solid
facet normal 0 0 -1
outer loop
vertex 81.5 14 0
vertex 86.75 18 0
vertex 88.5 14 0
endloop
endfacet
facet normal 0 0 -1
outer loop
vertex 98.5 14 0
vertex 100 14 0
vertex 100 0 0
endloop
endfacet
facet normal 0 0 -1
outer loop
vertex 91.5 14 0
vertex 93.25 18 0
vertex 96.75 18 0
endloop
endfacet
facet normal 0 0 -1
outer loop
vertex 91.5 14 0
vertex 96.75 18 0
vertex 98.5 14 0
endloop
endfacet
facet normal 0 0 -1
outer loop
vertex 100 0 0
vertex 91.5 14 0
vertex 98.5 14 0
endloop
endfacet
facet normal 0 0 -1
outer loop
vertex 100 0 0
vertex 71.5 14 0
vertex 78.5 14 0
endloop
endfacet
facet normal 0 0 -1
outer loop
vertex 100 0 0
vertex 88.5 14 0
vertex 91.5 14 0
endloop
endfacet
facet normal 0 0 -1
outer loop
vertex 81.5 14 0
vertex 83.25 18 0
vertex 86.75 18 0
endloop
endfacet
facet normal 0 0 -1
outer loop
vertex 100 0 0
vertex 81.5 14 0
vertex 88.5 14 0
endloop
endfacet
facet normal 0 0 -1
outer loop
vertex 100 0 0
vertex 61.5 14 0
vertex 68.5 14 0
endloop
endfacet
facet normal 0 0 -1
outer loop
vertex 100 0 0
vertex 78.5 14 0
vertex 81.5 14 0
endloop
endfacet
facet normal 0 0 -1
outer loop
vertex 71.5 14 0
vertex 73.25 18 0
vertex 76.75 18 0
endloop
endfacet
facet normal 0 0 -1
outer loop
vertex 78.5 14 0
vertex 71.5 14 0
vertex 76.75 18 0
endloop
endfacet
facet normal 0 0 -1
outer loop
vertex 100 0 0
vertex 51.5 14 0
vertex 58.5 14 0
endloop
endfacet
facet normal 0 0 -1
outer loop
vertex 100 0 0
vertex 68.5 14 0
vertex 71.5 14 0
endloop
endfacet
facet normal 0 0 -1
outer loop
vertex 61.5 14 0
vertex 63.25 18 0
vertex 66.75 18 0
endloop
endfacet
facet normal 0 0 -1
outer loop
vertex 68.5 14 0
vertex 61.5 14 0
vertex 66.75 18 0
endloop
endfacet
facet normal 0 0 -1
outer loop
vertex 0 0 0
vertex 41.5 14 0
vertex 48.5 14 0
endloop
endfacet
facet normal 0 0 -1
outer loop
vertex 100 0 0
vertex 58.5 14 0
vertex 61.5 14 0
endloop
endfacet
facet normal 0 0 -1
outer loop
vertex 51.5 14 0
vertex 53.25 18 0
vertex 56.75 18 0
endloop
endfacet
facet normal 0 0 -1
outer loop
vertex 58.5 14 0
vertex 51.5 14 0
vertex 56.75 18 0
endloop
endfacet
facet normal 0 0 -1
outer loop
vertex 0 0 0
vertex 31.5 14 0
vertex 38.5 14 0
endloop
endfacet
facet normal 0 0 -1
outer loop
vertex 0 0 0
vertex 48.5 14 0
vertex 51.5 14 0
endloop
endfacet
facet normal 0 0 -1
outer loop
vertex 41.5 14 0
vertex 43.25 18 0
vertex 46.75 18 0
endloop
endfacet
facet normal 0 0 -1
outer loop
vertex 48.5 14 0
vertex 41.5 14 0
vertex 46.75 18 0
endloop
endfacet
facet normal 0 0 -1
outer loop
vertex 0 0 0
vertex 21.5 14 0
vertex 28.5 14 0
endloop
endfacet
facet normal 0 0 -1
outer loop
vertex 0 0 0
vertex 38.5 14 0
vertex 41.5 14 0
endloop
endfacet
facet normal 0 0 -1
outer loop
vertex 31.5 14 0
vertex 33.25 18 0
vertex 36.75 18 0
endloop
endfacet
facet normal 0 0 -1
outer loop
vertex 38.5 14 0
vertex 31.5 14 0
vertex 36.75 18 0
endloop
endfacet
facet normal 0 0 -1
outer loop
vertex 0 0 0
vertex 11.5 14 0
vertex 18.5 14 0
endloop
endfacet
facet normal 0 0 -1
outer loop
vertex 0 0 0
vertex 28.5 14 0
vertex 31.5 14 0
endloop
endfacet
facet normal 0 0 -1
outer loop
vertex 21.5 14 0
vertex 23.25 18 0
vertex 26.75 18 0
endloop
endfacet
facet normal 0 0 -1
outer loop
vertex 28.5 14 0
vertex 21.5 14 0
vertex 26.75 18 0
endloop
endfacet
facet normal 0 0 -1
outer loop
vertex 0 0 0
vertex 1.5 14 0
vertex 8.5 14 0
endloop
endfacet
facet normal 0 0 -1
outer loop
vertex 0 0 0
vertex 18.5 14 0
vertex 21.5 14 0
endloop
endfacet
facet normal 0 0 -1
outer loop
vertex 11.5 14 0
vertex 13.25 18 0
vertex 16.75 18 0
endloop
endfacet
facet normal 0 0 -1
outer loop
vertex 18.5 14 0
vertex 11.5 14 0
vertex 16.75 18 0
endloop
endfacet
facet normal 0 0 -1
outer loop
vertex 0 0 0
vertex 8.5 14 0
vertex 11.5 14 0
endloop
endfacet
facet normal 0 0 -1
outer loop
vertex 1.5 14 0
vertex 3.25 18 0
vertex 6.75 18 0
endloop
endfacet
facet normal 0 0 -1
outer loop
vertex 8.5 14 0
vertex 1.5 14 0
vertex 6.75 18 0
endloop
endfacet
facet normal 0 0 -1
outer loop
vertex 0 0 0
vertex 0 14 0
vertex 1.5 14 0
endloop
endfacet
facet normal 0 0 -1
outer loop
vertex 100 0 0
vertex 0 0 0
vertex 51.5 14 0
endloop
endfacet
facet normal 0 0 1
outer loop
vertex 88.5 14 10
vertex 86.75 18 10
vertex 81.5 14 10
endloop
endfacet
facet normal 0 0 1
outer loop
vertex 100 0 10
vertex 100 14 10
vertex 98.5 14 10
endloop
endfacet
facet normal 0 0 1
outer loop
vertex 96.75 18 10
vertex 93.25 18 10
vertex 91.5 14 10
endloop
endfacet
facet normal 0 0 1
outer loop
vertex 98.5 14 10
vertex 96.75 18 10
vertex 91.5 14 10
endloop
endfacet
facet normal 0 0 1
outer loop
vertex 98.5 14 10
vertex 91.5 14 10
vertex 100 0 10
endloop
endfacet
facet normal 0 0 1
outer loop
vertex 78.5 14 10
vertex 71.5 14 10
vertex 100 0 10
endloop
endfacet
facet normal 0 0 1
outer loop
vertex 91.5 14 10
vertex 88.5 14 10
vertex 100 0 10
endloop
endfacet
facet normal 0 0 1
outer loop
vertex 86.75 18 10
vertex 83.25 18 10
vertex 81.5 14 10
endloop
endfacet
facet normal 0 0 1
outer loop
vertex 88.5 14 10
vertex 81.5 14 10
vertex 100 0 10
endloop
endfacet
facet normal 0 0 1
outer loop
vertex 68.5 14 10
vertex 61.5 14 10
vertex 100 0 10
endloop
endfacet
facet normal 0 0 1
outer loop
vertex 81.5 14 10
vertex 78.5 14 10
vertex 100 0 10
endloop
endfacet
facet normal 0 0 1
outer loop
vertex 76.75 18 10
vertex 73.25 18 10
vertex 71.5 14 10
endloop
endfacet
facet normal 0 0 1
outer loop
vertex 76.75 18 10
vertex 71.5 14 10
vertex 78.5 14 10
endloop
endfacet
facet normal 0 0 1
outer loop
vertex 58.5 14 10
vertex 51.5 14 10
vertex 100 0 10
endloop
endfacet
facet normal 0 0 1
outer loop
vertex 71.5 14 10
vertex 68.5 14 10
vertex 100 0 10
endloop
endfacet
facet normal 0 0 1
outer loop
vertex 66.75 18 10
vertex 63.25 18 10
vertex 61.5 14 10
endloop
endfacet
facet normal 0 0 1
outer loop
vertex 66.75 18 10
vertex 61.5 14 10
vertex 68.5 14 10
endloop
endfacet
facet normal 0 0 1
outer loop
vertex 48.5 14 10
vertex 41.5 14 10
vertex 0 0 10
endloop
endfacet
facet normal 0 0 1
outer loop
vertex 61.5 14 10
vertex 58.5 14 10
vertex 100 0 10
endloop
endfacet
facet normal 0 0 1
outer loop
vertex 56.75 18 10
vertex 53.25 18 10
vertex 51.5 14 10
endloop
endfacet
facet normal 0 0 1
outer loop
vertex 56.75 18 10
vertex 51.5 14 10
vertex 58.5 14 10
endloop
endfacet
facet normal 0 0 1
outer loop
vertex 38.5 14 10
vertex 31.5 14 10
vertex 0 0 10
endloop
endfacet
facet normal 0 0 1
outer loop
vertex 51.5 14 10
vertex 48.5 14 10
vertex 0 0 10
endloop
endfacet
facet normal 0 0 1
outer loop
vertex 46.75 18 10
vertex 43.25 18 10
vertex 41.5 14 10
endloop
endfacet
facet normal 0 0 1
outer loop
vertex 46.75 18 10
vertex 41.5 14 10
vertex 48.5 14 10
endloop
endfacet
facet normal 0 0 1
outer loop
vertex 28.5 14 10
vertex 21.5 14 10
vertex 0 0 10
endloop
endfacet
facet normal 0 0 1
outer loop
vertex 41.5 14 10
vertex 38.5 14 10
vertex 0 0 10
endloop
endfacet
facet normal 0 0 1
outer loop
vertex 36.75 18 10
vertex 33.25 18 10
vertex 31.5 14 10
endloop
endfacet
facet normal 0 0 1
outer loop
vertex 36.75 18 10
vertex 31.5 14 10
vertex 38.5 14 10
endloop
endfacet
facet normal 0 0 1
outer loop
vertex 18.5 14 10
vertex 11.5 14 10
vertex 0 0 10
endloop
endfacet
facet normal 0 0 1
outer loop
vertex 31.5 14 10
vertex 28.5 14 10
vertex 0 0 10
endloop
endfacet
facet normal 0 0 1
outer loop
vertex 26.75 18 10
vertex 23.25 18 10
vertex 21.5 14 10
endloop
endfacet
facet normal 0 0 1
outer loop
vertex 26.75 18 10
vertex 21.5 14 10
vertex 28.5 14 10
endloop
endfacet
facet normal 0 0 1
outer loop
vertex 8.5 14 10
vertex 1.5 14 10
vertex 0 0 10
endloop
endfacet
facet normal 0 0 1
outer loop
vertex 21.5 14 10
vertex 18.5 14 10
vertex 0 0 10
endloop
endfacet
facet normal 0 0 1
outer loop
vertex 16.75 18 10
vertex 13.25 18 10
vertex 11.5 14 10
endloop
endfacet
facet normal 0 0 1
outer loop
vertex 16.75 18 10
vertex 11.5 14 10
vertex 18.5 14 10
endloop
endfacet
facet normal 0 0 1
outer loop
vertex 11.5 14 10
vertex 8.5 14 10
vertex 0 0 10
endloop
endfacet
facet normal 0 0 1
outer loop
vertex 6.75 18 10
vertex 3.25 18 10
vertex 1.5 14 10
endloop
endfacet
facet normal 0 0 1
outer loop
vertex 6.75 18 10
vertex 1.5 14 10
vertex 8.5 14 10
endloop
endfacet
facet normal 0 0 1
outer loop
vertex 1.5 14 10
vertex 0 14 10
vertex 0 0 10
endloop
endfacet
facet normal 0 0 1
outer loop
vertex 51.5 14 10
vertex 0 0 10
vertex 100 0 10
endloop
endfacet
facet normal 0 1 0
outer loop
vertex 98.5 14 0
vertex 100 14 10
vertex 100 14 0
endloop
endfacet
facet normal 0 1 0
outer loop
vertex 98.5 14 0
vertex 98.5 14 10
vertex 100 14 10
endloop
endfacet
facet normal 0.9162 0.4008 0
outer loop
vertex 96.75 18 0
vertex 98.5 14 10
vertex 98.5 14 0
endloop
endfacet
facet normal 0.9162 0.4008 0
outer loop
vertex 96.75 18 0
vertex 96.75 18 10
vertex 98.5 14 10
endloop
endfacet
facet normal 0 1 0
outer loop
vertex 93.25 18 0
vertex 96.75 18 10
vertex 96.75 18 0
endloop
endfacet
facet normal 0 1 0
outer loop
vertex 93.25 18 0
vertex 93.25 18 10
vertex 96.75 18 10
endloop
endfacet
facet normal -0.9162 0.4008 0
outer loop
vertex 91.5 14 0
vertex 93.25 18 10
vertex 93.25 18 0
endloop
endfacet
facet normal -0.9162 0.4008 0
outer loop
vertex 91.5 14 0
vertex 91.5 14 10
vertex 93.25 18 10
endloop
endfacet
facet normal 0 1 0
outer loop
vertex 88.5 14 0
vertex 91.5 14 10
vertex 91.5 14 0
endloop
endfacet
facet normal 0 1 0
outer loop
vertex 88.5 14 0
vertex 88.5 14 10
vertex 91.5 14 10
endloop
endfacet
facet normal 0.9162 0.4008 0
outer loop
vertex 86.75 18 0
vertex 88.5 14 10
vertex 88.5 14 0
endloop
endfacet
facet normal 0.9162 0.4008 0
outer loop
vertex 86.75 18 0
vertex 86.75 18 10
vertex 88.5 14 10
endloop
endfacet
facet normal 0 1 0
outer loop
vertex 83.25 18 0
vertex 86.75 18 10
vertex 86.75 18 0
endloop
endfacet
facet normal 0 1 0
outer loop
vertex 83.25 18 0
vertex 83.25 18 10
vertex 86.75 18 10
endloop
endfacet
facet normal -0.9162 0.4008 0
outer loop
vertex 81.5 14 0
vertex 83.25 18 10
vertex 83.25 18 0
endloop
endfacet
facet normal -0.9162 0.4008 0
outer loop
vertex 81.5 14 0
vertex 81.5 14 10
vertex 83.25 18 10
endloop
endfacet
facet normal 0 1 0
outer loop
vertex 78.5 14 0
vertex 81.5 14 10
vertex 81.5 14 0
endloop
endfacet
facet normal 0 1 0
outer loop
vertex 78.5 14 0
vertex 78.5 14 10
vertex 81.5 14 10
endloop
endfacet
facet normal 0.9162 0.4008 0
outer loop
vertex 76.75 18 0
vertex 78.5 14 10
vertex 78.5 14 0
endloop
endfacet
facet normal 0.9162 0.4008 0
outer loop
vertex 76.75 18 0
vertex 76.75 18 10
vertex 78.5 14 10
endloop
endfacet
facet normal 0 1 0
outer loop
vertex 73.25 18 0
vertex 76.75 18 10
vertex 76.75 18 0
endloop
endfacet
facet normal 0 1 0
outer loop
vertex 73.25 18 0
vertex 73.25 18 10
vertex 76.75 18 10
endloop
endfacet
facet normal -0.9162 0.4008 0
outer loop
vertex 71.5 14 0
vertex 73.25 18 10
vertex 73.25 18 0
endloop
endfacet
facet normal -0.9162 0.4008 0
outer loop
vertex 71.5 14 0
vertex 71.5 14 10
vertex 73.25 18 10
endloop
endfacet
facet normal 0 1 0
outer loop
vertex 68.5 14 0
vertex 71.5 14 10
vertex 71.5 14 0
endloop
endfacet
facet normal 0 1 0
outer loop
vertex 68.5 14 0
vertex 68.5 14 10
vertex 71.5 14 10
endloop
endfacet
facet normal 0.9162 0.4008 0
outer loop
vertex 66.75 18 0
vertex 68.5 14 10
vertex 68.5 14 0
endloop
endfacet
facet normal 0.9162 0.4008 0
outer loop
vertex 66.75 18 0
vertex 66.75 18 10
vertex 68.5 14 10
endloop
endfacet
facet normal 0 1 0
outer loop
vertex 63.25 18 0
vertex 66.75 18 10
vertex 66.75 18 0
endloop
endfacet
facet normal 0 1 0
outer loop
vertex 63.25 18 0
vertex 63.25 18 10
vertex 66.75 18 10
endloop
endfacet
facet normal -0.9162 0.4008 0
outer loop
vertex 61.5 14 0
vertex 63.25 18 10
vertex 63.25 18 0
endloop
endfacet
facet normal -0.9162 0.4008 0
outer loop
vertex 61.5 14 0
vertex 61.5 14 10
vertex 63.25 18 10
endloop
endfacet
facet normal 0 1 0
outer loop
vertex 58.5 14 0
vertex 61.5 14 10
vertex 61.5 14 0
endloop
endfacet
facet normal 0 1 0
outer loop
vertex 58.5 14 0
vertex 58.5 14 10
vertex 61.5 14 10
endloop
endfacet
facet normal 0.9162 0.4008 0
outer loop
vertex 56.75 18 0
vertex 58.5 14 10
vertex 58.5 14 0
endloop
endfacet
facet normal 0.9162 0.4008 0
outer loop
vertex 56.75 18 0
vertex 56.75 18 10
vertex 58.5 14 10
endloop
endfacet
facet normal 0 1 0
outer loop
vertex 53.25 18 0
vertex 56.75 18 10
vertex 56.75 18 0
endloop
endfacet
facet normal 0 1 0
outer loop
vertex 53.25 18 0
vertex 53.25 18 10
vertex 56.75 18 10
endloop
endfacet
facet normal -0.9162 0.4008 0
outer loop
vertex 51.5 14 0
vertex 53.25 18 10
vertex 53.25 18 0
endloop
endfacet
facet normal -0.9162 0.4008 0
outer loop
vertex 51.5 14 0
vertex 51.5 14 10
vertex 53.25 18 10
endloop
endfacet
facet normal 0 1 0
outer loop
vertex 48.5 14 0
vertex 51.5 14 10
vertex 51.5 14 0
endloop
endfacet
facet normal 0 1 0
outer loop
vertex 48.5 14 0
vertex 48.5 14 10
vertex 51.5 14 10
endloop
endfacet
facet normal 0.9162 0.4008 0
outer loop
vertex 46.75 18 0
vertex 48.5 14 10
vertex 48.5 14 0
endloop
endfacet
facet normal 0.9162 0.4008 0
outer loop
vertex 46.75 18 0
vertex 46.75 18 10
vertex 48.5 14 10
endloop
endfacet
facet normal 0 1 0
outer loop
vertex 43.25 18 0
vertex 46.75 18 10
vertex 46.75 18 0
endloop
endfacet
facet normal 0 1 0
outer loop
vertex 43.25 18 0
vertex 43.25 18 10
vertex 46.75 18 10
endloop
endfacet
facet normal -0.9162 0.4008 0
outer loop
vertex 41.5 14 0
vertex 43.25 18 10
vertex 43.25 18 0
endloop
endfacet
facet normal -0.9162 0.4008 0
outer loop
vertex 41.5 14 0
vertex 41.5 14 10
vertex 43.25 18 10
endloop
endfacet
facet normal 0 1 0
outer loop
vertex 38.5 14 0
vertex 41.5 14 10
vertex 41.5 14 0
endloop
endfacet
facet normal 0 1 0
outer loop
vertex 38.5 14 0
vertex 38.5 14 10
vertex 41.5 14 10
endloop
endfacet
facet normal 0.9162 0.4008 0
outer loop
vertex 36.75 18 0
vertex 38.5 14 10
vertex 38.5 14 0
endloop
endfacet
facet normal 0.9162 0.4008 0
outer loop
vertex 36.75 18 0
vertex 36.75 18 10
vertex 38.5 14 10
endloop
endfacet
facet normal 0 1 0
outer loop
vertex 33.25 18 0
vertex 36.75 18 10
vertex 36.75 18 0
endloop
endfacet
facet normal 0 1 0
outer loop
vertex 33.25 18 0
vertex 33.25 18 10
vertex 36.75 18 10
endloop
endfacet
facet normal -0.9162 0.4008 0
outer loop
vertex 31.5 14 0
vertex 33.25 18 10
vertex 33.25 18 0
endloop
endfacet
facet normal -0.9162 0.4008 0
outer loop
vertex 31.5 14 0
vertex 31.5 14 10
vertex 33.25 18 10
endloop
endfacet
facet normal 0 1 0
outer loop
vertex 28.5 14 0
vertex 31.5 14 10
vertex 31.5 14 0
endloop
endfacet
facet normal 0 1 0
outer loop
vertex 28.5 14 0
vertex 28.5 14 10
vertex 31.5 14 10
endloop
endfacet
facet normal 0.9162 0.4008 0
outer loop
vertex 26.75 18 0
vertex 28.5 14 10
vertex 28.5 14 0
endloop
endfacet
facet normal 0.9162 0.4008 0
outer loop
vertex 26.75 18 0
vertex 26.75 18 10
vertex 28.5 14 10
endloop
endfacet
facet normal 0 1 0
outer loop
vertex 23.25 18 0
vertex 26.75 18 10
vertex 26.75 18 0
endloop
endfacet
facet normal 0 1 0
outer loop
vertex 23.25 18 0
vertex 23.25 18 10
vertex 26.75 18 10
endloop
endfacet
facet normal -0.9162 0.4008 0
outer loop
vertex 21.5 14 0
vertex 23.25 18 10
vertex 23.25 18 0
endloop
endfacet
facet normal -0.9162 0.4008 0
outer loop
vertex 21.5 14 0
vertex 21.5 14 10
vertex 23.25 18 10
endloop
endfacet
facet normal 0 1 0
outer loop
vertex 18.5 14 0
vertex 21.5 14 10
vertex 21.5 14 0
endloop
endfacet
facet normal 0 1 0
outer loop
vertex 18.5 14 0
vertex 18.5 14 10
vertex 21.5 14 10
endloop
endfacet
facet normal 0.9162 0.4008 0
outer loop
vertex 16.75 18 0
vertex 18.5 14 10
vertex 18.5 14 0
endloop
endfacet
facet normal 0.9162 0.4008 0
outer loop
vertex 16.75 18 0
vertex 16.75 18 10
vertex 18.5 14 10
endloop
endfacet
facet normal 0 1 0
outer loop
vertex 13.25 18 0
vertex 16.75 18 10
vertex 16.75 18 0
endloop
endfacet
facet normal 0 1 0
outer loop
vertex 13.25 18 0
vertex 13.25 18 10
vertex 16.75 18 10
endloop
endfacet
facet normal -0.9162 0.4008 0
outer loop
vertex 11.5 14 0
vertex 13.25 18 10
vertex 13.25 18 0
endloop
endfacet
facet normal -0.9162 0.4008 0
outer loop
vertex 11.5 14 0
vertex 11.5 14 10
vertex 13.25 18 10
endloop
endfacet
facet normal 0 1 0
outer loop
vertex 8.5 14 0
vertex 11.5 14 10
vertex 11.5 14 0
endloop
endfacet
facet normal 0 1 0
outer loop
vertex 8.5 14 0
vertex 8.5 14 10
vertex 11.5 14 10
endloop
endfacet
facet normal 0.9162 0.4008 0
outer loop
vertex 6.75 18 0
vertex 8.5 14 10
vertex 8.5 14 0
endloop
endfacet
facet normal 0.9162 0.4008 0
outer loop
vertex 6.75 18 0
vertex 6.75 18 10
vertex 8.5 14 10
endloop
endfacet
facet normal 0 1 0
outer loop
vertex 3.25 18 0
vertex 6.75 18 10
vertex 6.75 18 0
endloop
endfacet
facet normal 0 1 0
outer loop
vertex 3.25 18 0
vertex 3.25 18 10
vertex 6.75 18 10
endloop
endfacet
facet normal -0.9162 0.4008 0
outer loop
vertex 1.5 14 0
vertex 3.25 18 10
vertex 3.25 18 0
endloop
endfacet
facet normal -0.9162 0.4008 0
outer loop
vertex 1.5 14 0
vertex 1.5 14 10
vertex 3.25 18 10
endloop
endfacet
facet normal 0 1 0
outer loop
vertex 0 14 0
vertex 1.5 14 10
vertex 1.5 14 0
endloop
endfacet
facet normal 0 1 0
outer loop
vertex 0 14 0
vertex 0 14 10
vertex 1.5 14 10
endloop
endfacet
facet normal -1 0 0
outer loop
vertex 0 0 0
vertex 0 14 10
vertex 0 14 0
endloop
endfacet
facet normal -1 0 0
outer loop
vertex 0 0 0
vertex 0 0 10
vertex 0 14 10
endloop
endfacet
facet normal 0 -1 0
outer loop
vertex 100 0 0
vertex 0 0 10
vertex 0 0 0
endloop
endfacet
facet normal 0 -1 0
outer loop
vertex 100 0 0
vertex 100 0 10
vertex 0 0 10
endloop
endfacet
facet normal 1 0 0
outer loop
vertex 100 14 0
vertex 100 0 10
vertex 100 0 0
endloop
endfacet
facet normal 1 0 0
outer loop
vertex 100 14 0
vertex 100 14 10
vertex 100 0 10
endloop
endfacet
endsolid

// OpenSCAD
$fn = 32;

// ----------------------------------------------------------------------
// Gear rack: 10 teeth, pitch 10 mm
// ----------------------------------------------------------------------

// --- parameters (mm) ---
teeth = 10;               // number of teeth
pitch = 10;               // tooth pitch, X
root_w = 7;               // tooth width at the root
tip_w = 3.5;              // tooth width at the tip
base_h = 14;              // rack body height, Y
tooth_h = 4;              // tooth height above the body
plate_t = 10;             // rack width, Z (extrusion height)

rack_l = teeth * pitch;  // overall length
total_h = base_h + tooth_h;  // overall height

profile = [[0, 0], [100, 0], [100, 14], [98.5, 14], [96.75, 18], [93.25, 18], [91.5, 14], [88.5, 14], [86.75, 18], [83.25, 18], [81.5, 14], [78.5, 14], [76.75, 18], [73.25, 18], [71.5, 14], [68.5, 14], [66.75, 18], [63.25, 18], [61.5, 14], [58.5, 14], [56.75, 18], [53.25, 18], [51.5, 14], [48.5, 14], [46.75, 18], [43.25, 18], [41.5, 14], [38.5, 14], [36.75, 18], [33.25, 18], [31.5, 14], [28.5, 14], [26.75, 18], [23.25, 18], [21.5, 14], [18.5, 14], [16.75, 18], [13.25, 18], [11.5, 14], [8.5, 14], [6.75, 18], [3.25, 18], [1.5, 14], [0, 14]];  // primary outline, 44 points, counter clockwise

// --- the one profile operation ---
linear_extrude(height = plate_t) polygon(points = profile);
